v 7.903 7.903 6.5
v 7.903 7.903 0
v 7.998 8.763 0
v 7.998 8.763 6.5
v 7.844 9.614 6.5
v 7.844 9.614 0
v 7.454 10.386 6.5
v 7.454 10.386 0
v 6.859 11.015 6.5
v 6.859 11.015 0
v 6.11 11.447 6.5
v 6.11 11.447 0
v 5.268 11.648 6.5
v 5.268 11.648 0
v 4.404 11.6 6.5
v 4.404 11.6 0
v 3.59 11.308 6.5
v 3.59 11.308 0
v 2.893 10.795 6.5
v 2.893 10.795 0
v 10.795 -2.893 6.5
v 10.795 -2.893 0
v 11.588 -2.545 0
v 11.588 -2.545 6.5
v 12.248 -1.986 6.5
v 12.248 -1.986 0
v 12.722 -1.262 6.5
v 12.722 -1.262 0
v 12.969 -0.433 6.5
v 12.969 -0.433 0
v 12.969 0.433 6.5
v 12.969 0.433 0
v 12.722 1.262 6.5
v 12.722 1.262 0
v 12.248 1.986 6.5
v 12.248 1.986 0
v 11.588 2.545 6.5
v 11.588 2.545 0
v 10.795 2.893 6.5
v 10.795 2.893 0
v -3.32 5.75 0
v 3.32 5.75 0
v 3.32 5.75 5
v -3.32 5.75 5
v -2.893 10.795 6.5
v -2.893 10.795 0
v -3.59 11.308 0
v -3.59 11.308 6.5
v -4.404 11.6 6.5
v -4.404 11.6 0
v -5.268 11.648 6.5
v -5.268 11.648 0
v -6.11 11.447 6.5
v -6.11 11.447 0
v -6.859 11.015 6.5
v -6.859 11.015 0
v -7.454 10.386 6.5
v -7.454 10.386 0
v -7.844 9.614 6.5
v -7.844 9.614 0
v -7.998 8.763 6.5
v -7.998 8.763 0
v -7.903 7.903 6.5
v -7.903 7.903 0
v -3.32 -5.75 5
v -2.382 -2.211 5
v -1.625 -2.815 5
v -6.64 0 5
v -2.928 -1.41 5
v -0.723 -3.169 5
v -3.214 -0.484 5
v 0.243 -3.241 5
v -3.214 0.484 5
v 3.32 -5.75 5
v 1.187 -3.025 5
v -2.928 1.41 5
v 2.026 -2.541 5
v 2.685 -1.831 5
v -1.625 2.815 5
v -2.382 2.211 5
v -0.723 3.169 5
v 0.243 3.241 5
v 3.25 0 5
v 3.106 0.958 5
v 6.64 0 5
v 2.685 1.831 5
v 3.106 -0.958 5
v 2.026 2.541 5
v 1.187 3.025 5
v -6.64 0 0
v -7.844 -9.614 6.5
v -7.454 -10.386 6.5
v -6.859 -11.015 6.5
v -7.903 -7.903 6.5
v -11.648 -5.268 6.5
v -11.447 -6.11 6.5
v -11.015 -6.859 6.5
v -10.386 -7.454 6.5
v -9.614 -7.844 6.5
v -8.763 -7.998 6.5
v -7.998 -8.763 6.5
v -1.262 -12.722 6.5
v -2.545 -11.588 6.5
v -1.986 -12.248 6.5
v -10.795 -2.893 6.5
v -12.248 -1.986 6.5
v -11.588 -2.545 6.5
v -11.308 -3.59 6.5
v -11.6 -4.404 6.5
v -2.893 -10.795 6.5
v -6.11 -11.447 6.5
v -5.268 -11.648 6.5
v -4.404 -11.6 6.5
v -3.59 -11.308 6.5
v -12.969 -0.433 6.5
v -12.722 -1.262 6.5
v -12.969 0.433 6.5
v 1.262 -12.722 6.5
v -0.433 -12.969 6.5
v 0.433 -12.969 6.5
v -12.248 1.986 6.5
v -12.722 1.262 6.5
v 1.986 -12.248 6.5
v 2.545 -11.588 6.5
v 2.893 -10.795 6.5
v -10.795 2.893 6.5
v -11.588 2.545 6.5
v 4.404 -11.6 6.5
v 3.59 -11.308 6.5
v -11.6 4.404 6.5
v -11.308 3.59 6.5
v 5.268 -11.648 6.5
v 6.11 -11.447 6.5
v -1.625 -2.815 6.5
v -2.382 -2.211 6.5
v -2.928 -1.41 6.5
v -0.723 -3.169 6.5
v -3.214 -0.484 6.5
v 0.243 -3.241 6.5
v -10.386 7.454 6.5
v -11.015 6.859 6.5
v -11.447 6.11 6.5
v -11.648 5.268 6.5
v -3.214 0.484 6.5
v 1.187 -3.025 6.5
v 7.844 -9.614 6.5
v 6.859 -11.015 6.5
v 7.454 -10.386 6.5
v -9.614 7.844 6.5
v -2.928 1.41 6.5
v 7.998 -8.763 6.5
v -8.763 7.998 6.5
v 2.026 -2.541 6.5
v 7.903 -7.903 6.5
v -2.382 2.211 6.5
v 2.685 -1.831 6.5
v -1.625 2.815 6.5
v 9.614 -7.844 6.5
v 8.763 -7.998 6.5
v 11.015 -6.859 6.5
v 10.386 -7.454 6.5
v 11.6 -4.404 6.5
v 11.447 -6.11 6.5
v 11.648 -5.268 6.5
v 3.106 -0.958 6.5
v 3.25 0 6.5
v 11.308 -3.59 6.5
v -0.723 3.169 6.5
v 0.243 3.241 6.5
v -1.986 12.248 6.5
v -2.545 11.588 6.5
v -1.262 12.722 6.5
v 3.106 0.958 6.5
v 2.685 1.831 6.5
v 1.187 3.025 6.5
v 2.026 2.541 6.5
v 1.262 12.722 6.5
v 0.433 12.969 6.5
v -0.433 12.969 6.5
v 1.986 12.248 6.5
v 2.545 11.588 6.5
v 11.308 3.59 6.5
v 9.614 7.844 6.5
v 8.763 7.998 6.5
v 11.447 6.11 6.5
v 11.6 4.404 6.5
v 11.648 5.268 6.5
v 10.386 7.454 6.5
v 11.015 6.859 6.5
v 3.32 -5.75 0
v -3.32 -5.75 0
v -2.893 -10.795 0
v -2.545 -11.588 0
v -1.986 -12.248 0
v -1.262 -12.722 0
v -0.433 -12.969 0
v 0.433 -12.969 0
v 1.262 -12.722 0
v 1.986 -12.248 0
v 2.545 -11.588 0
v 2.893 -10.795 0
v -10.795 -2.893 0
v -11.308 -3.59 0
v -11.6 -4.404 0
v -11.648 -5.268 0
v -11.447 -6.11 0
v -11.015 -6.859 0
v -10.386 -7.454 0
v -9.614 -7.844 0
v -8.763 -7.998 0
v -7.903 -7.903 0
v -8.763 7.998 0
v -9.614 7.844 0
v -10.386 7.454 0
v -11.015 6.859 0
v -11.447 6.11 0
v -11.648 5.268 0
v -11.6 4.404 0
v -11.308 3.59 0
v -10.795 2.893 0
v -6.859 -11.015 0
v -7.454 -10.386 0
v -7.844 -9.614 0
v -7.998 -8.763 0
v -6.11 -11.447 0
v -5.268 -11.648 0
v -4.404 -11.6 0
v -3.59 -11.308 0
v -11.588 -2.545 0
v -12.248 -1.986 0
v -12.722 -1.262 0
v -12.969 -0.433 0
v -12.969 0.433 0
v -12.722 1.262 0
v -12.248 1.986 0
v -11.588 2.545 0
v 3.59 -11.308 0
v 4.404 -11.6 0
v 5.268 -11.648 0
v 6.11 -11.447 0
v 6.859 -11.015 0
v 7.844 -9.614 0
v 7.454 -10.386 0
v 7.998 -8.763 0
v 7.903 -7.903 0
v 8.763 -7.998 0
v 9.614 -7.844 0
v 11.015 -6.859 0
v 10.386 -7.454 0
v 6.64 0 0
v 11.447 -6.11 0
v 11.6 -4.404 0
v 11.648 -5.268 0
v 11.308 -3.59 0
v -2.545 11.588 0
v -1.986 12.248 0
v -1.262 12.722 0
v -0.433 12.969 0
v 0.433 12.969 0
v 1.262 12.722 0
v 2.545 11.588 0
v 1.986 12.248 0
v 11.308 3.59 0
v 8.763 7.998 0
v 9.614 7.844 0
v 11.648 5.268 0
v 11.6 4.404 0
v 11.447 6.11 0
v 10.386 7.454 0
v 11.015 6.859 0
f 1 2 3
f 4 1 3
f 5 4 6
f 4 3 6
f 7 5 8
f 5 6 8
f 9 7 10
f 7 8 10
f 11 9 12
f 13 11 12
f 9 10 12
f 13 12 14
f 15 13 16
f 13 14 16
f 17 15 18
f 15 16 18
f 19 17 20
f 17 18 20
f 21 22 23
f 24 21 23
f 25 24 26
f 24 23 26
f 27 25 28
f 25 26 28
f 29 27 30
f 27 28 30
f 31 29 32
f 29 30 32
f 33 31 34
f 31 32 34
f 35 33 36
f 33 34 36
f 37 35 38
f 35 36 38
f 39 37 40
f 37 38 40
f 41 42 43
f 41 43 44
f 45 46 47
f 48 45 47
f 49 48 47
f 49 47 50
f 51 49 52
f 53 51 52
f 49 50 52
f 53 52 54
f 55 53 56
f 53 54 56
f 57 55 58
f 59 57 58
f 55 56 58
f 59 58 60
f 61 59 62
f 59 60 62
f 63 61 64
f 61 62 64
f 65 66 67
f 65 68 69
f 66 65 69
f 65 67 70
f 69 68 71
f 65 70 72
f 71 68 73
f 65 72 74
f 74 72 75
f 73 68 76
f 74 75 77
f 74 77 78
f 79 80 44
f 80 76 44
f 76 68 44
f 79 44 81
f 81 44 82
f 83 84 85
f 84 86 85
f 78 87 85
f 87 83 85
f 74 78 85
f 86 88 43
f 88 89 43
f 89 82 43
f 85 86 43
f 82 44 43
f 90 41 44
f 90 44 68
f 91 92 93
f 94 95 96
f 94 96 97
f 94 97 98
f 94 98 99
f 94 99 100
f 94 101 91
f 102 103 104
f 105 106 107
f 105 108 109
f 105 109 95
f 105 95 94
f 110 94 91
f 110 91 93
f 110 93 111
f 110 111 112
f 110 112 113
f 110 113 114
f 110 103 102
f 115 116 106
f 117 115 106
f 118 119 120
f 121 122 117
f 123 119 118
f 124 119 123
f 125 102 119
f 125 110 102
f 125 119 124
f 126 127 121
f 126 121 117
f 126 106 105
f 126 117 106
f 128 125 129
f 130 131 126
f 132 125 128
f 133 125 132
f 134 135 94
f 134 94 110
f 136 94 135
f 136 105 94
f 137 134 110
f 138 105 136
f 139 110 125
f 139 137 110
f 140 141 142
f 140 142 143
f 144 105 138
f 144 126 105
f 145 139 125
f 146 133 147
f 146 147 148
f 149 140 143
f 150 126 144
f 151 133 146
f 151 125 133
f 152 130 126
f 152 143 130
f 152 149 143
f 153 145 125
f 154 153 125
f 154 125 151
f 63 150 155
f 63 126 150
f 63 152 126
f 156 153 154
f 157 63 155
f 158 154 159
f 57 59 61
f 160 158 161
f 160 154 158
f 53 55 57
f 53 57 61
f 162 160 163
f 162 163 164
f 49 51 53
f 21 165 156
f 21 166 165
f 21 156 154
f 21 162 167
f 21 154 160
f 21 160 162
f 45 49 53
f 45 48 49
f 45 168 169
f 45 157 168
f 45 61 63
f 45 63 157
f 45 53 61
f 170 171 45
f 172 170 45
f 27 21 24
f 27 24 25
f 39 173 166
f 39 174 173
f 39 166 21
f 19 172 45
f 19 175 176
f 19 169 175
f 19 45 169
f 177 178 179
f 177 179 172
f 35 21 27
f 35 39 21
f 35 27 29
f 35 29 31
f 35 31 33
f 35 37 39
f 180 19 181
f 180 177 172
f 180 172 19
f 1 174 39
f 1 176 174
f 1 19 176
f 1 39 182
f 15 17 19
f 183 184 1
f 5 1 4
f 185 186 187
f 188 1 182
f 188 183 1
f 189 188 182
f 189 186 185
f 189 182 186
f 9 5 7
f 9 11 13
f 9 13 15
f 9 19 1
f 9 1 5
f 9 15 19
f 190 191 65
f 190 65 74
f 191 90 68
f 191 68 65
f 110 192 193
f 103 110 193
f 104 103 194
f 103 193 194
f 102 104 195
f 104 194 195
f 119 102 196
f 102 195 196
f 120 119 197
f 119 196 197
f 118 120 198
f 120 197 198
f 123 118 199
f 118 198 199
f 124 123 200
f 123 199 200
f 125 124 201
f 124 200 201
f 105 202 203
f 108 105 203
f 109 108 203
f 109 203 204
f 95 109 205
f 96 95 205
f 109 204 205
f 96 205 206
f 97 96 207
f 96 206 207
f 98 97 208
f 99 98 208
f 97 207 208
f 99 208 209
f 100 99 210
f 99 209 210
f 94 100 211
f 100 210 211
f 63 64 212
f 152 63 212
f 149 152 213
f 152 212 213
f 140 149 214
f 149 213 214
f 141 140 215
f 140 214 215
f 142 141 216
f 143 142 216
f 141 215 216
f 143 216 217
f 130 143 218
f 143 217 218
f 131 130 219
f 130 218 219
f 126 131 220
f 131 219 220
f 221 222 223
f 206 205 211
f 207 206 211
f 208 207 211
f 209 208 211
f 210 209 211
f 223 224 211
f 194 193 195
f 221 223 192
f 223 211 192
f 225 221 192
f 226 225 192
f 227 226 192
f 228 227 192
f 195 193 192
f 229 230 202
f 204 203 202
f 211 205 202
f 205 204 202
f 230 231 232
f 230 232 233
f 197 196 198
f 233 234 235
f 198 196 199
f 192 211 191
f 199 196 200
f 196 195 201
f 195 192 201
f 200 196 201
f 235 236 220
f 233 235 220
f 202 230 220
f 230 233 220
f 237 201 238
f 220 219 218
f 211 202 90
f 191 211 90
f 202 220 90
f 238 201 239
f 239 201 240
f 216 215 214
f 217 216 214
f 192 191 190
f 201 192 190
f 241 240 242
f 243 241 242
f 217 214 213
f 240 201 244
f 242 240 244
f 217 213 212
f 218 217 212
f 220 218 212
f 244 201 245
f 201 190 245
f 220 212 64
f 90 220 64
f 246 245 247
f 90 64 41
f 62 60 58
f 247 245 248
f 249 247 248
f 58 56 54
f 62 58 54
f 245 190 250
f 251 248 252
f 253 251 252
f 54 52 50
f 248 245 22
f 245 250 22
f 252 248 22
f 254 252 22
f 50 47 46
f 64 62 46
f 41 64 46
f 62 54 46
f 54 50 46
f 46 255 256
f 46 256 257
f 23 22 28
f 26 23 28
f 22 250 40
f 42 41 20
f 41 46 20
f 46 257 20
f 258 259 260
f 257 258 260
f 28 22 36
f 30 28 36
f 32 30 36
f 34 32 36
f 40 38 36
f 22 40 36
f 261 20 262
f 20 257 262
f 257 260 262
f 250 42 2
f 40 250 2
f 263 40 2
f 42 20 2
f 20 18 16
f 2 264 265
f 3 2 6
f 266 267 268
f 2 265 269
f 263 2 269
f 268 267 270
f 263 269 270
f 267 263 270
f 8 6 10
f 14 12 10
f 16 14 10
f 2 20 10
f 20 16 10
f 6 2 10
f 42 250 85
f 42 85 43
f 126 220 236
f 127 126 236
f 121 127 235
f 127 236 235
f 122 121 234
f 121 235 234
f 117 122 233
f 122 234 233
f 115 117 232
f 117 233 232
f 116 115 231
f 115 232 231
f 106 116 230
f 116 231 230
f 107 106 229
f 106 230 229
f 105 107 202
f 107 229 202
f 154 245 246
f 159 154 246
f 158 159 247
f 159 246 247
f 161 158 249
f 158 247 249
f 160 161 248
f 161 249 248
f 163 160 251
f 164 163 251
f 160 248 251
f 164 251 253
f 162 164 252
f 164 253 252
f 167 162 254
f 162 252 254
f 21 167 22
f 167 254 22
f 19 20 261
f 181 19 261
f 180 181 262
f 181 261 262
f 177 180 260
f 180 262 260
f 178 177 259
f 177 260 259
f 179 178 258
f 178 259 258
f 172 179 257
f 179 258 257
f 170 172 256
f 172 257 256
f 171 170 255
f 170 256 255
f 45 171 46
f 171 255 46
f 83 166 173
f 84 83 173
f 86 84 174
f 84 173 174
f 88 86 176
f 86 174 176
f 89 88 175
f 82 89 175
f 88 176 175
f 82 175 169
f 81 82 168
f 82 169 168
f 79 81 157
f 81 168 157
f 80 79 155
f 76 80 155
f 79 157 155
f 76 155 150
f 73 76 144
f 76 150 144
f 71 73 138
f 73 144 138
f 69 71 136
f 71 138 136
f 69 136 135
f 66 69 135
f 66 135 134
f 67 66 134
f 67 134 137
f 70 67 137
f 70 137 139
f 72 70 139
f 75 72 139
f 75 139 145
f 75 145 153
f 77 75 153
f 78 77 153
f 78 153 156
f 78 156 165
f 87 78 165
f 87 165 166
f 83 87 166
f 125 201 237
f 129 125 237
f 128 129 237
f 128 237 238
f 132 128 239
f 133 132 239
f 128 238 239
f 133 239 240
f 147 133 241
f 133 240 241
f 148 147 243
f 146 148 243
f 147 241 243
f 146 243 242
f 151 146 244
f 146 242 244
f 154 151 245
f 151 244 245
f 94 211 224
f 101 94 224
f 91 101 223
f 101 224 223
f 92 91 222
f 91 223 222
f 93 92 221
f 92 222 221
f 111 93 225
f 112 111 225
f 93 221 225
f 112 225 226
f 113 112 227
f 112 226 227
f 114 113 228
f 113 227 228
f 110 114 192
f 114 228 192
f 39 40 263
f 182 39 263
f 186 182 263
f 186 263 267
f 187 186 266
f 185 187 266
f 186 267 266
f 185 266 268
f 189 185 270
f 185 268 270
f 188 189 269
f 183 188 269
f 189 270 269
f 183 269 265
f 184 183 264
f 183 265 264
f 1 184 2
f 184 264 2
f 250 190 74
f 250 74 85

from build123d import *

# Parameters (mm, degrees)
F1_DEPTH = 6.5
F2_R     = 3.25
F3_DEPTH = 25
F5_DEPTH = 5


with BuildPart() as f1:
    # F0 (on Top) → F1 (new body)
    with BuildSketch(Plane.XY):
        with BuildLine():
            ThreePointArc((2.892627, 10.795431), (0, 13), (-2.892627, 10.795431))
            ThreePointArc((-2.892627, 10.795431), (-6.5, 11.25833), (-7.902804, 7.902804))
            ThreePointArc((-7.902804, 7.902804), (-11.25833, 6.5), (-10.795431, 2.892627))
            ThreePointArc((-10.795431, 2.892627), (-13, 0), (-10.795431, -2.892627))
            ThreePointArc((-10.795431, -2.892627), (-11.25833, -6.5), (-7.902804, -7.902804))
            ThreePointArc((-7.902804, -7.902804), (-6.5, -11.25833), (-2.892627, -10.795431))
            ThreePointArc((-2.892627, -10.795431), (0, -13), (2.892627, -10.795431))
            ThreePointArc((2.892627, -10.795431), (6.5, -11.25833), (7.902804, -7.902804))
            ThreePointArc((7.902804, -7.902804), (11.25833, -6.5), (10.795431, -2.892627))
            ThreePointArc((10.795431, -2.892627), (13, 0), (10.795431, 2.892627))
            ThreePointArc((10.795431, 2.892627), (11.25833, 6.5), (7.902804, 7.902804))
            ThreePointArc((7.902804, 7.902804), (6.5, 11.25833), (2.892627, 10.795431))
        make_face()
    extrude(amount=F1_DEPTH)

    # F2 (on face) → F3 (cut)
    with BuildSketch(Plane.XY.offset(6.5)):
        Circle(F2_R)
    extrude(amount=-F3_DEPTH, mode=Mode.SUBTRACT)

    # F4 (on Top) → F5 (cut)
    with BuildSketch(Plane.XY):
        Polygon((3.319764, 5.75), (-3.319764, 5.75), (-6.639528, 0), (-3.319764, -5.75), (3.319764, -5.75), (6.639528, 0), align=None)
    extrude(amount=F5_DEPTH, mode=Mode.SUBTRACT)


solid = f1.part
